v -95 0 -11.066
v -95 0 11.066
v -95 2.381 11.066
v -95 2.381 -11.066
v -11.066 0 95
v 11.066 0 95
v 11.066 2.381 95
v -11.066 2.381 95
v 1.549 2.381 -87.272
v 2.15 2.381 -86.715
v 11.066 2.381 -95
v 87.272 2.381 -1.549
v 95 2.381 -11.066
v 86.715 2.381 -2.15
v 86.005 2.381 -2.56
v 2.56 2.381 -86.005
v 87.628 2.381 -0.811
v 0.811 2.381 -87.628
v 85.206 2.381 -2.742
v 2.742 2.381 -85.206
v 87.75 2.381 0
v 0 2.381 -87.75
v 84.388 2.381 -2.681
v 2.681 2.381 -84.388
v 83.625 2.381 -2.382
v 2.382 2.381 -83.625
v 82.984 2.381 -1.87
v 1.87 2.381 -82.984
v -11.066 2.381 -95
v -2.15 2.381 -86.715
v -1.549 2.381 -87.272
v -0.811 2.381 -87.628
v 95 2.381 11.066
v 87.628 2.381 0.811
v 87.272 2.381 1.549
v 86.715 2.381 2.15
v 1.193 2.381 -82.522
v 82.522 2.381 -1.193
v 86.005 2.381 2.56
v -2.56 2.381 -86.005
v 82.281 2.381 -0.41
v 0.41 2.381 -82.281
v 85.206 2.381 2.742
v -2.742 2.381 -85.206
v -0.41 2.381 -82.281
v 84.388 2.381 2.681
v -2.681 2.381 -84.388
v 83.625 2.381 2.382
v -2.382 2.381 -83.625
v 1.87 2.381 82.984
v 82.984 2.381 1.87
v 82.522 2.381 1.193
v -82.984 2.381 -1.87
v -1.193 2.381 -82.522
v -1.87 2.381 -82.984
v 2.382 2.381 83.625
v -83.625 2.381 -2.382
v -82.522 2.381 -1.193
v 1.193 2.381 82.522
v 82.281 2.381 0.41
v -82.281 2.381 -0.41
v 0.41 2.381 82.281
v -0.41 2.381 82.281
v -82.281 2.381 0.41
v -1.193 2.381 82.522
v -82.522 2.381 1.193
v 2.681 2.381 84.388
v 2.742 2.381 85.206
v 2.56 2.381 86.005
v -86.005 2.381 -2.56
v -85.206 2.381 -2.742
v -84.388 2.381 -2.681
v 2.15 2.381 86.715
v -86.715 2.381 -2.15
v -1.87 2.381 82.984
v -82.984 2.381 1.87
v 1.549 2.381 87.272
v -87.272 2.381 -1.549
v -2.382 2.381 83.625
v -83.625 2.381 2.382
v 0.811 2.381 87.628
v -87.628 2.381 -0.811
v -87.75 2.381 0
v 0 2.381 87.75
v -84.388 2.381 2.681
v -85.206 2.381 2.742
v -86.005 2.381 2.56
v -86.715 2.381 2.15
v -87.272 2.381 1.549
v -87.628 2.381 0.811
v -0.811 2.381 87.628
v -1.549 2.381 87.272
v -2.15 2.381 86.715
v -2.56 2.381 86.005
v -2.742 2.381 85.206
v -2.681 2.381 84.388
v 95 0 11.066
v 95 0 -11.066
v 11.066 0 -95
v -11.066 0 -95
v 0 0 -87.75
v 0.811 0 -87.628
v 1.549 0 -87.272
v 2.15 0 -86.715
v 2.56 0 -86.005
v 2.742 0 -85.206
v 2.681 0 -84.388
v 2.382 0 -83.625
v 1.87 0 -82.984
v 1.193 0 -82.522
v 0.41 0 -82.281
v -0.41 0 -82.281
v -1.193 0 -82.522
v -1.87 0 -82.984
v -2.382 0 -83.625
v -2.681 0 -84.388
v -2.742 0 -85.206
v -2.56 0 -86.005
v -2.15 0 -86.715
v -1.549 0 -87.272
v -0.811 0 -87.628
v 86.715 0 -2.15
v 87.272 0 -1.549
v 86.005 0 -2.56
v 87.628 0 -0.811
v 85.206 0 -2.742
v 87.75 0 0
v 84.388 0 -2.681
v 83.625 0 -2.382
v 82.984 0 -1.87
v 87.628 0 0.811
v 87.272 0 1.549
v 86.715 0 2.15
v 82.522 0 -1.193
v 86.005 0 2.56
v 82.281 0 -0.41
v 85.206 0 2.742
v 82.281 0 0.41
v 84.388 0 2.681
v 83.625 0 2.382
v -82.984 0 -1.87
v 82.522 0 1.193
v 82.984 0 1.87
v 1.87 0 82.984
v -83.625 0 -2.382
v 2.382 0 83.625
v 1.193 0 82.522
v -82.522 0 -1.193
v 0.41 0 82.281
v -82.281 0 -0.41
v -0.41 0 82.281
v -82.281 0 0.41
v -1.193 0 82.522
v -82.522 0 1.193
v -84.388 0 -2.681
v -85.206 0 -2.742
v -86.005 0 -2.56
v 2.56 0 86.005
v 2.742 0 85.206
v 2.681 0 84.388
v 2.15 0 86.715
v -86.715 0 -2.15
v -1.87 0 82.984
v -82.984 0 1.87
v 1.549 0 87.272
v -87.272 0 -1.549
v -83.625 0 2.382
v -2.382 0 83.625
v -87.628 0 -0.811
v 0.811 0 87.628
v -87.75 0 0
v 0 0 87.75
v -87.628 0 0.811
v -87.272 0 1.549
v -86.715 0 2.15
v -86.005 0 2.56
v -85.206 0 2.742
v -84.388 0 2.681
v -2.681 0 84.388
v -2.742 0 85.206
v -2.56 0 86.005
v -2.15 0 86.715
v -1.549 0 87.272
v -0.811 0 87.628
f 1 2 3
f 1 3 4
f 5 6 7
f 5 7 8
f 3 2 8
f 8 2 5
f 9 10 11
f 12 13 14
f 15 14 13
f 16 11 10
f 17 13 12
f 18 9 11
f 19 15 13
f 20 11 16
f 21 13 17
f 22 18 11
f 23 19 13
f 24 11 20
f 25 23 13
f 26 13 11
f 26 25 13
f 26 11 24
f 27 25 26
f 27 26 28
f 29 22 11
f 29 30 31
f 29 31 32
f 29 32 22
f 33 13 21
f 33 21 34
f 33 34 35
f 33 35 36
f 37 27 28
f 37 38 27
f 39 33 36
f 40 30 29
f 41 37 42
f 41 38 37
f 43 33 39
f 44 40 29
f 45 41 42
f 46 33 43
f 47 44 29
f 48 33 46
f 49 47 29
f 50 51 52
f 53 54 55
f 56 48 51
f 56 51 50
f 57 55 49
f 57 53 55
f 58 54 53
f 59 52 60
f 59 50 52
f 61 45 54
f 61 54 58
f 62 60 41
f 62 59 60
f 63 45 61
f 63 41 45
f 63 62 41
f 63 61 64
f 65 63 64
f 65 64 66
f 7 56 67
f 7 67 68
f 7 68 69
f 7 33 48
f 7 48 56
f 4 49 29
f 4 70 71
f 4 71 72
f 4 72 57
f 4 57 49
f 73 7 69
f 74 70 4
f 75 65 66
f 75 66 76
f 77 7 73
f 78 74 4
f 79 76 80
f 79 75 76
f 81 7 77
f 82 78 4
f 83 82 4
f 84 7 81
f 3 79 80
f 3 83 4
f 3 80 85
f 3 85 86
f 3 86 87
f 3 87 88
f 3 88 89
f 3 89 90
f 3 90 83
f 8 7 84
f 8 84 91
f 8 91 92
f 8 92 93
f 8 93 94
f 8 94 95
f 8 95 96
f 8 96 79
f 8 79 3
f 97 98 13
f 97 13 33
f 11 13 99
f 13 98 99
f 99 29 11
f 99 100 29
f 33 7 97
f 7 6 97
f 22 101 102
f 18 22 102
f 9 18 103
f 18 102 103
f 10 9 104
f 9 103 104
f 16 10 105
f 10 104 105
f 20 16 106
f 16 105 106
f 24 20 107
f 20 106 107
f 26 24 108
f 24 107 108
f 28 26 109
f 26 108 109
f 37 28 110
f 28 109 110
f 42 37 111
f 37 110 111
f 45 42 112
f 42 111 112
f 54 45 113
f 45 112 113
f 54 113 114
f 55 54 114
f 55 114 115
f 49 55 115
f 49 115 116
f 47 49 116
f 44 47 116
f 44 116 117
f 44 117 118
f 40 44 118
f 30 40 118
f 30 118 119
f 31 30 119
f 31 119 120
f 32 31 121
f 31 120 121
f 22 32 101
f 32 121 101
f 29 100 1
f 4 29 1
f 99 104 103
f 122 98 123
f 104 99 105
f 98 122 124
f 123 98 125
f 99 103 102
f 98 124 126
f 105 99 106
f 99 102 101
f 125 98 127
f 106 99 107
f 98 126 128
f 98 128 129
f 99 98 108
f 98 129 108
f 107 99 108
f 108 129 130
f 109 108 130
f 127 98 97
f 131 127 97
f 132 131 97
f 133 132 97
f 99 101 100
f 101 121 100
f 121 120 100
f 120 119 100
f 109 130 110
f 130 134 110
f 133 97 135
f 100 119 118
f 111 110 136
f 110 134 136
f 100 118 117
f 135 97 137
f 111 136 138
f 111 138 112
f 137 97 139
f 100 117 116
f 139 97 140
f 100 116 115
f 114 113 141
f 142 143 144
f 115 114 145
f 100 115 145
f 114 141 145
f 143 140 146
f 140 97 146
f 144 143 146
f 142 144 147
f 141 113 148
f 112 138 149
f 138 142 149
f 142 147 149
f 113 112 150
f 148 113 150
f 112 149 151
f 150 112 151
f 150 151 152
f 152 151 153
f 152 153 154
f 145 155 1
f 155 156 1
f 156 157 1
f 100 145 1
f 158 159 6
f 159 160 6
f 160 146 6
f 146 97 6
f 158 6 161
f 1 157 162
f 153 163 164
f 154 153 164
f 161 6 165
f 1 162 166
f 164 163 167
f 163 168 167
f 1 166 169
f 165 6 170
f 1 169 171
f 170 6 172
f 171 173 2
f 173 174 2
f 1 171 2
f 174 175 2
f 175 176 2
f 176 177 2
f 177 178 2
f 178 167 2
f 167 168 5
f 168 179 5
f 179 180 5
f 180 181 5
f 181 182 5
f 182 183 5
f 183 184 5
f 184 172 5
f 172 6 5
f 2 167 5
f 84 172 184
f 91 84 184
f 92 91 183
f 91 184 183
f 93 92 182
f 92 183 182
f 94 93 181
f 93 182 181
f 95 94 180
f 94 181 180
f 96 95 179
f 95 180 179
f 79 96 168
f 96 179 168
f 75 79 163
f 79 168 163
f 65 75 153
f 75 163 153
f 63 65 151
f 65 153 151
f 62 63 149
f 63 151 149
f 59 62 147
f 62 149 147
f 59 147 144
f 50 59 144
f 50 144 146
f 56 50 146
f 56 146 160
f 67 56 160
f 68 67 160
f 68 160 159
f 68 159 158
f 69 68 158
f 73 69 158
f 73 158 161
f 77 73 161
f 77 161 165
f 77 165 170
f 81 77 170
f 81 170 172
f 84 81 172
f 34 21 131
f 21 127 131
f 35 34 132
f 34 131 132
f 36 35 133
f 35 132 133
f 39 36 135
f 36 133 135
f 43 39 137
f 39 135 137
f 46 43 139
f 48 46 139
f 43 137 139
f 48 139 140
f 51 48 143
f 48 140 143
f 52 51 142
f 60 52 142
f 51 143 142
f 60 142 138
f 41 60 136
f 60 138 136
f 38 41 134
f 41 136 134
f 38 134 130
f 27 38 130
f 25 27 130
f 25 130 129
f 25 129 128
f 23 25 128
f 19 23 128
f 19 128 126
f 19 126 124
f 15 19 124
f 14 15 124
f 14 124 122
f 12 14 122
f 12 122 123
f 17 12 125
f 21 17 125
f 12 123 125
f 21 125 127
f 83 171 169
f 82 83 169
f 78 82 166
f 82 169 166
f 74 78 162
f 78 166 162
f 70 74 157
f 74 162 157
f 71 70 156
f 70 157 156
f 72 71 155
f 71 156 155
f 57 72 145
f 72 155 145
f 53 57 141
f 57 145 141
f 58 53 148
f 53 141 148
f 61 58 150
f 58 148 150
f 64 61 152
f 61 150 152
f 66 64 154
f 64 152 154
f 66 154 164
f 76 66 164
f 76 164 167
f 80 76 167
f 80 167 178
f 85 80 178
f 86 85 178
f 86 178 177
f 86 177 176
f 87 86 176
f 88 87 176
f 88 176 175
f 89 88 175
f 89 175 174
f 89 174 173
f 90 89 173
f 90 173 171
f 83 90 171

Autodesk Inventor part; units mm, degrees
ref_plane "YZ Plane" through (0, 0, 0) normal (1, 0, 0) x (0, 1, 0)
ref_plane "XZ Plane" through (0, 0, 0) normal (0, 1, 0) x (-1, 0, 0)
ref_plane "XY Plane" through (0, 0, 0) normal (0, 0, 1) x (1, 0, 0)
sketch "Sketch1" plane through (0, 0, 0) normal (0, 1, 0) x (-1, 0, 0)
  line L0 (95, -95) -> (-95, -95)
  line L1 (-95, -95) -> (-95, 95)
  line L2 (-95, 95) -> (95, 95)
  line L3 (95, 95) -> (95, -95)
  line L4 (95, -95) -> (-95, 95) construction
  line L5 (-95, -95) -> (95, 95) construction
  point P0 (0, 0)
  point P1 (0, 0)
  point P2 (0, 0)
  dimension "d25" = 190
extrude "Extrusion1" add sketch "Sketch1" along normal blind 2.3813
sketch "Sketch2" plane through (0, 2.3813, 0) normal (0, 1, 0) x (1, 0, 0)
  line L0 (-95, -95) -> (95, -95) projected
  point P0 (0, 0)
  point P1 (0, -85)
  dimension "d26" = 10
hole "Hole1" at (0, 2.3813, 85) direction (0, -1, 0) diameter 5.5 end through all clearance for "Socket Head Cap Screw" size "M5" standard "Ansi Metric M Profile"
pattern_circular "Circular Pattern1" count 4 over 360 about axis through (0, -10, 0) along (0, 1, 0) of "Hole1"
sketch "Sketch3" plane through (0, 0, 0) normal (0, -1, 0) x (1, 0, 0)
  circle A0 centre (-85, 0) radius 2.75 projected
  circle A1 centre (0, -85) radius 2.75 projected
  circle A2 centre (85, 0) radius 2.75 projected
  circle A3 centre (0, 85) radius 2.75 projected
  line L0 (-95, -95) -> (95, -95) projected
  line L1 (95, -95) -> (95, 95) projected
  line L2 (95, 95) -> (-95, 95) projected
  line L3 (-95, 95) -> (-95, -95) projected
  line L4 (0, 106.066) -> (106.066, 0)
  line L5 (106.066, 0) -> (0, -106.066)
  line L6 (0, -106.066) -> (-106.066, 0)
  line L7 (-106.066, 0) -> (0, 106.066)
  line L8 (-106.066, 0) -> (106.066, 0) construction
  line L9 (0, -106.066) -> (0, 106.066) construction
  point P0 (0, 0)
  point P1 (0, 0)
  point P2 (0, 0)
  dimension "d27" = 150
  dimension "d28" = 150
extrude "Extrusion2" cut sketch "Sketch3" against normal through all contours L6 L3 L7 L2 L4 L1 L5 L0 | L0 L5 L6 | L6 L7 L3 | L1 L4 L5 | L7 L4 L2 keep common part
equation "\"d7\" = suppourtPanelThickness"
equation "\"d28\" = d27"
equation "\"panelChamfer\" = 75"
equation "\"suppourtPanelThickness\" = 2.38125"
properties part number "separatingPanels" material "Polycarbonate, Clear"
